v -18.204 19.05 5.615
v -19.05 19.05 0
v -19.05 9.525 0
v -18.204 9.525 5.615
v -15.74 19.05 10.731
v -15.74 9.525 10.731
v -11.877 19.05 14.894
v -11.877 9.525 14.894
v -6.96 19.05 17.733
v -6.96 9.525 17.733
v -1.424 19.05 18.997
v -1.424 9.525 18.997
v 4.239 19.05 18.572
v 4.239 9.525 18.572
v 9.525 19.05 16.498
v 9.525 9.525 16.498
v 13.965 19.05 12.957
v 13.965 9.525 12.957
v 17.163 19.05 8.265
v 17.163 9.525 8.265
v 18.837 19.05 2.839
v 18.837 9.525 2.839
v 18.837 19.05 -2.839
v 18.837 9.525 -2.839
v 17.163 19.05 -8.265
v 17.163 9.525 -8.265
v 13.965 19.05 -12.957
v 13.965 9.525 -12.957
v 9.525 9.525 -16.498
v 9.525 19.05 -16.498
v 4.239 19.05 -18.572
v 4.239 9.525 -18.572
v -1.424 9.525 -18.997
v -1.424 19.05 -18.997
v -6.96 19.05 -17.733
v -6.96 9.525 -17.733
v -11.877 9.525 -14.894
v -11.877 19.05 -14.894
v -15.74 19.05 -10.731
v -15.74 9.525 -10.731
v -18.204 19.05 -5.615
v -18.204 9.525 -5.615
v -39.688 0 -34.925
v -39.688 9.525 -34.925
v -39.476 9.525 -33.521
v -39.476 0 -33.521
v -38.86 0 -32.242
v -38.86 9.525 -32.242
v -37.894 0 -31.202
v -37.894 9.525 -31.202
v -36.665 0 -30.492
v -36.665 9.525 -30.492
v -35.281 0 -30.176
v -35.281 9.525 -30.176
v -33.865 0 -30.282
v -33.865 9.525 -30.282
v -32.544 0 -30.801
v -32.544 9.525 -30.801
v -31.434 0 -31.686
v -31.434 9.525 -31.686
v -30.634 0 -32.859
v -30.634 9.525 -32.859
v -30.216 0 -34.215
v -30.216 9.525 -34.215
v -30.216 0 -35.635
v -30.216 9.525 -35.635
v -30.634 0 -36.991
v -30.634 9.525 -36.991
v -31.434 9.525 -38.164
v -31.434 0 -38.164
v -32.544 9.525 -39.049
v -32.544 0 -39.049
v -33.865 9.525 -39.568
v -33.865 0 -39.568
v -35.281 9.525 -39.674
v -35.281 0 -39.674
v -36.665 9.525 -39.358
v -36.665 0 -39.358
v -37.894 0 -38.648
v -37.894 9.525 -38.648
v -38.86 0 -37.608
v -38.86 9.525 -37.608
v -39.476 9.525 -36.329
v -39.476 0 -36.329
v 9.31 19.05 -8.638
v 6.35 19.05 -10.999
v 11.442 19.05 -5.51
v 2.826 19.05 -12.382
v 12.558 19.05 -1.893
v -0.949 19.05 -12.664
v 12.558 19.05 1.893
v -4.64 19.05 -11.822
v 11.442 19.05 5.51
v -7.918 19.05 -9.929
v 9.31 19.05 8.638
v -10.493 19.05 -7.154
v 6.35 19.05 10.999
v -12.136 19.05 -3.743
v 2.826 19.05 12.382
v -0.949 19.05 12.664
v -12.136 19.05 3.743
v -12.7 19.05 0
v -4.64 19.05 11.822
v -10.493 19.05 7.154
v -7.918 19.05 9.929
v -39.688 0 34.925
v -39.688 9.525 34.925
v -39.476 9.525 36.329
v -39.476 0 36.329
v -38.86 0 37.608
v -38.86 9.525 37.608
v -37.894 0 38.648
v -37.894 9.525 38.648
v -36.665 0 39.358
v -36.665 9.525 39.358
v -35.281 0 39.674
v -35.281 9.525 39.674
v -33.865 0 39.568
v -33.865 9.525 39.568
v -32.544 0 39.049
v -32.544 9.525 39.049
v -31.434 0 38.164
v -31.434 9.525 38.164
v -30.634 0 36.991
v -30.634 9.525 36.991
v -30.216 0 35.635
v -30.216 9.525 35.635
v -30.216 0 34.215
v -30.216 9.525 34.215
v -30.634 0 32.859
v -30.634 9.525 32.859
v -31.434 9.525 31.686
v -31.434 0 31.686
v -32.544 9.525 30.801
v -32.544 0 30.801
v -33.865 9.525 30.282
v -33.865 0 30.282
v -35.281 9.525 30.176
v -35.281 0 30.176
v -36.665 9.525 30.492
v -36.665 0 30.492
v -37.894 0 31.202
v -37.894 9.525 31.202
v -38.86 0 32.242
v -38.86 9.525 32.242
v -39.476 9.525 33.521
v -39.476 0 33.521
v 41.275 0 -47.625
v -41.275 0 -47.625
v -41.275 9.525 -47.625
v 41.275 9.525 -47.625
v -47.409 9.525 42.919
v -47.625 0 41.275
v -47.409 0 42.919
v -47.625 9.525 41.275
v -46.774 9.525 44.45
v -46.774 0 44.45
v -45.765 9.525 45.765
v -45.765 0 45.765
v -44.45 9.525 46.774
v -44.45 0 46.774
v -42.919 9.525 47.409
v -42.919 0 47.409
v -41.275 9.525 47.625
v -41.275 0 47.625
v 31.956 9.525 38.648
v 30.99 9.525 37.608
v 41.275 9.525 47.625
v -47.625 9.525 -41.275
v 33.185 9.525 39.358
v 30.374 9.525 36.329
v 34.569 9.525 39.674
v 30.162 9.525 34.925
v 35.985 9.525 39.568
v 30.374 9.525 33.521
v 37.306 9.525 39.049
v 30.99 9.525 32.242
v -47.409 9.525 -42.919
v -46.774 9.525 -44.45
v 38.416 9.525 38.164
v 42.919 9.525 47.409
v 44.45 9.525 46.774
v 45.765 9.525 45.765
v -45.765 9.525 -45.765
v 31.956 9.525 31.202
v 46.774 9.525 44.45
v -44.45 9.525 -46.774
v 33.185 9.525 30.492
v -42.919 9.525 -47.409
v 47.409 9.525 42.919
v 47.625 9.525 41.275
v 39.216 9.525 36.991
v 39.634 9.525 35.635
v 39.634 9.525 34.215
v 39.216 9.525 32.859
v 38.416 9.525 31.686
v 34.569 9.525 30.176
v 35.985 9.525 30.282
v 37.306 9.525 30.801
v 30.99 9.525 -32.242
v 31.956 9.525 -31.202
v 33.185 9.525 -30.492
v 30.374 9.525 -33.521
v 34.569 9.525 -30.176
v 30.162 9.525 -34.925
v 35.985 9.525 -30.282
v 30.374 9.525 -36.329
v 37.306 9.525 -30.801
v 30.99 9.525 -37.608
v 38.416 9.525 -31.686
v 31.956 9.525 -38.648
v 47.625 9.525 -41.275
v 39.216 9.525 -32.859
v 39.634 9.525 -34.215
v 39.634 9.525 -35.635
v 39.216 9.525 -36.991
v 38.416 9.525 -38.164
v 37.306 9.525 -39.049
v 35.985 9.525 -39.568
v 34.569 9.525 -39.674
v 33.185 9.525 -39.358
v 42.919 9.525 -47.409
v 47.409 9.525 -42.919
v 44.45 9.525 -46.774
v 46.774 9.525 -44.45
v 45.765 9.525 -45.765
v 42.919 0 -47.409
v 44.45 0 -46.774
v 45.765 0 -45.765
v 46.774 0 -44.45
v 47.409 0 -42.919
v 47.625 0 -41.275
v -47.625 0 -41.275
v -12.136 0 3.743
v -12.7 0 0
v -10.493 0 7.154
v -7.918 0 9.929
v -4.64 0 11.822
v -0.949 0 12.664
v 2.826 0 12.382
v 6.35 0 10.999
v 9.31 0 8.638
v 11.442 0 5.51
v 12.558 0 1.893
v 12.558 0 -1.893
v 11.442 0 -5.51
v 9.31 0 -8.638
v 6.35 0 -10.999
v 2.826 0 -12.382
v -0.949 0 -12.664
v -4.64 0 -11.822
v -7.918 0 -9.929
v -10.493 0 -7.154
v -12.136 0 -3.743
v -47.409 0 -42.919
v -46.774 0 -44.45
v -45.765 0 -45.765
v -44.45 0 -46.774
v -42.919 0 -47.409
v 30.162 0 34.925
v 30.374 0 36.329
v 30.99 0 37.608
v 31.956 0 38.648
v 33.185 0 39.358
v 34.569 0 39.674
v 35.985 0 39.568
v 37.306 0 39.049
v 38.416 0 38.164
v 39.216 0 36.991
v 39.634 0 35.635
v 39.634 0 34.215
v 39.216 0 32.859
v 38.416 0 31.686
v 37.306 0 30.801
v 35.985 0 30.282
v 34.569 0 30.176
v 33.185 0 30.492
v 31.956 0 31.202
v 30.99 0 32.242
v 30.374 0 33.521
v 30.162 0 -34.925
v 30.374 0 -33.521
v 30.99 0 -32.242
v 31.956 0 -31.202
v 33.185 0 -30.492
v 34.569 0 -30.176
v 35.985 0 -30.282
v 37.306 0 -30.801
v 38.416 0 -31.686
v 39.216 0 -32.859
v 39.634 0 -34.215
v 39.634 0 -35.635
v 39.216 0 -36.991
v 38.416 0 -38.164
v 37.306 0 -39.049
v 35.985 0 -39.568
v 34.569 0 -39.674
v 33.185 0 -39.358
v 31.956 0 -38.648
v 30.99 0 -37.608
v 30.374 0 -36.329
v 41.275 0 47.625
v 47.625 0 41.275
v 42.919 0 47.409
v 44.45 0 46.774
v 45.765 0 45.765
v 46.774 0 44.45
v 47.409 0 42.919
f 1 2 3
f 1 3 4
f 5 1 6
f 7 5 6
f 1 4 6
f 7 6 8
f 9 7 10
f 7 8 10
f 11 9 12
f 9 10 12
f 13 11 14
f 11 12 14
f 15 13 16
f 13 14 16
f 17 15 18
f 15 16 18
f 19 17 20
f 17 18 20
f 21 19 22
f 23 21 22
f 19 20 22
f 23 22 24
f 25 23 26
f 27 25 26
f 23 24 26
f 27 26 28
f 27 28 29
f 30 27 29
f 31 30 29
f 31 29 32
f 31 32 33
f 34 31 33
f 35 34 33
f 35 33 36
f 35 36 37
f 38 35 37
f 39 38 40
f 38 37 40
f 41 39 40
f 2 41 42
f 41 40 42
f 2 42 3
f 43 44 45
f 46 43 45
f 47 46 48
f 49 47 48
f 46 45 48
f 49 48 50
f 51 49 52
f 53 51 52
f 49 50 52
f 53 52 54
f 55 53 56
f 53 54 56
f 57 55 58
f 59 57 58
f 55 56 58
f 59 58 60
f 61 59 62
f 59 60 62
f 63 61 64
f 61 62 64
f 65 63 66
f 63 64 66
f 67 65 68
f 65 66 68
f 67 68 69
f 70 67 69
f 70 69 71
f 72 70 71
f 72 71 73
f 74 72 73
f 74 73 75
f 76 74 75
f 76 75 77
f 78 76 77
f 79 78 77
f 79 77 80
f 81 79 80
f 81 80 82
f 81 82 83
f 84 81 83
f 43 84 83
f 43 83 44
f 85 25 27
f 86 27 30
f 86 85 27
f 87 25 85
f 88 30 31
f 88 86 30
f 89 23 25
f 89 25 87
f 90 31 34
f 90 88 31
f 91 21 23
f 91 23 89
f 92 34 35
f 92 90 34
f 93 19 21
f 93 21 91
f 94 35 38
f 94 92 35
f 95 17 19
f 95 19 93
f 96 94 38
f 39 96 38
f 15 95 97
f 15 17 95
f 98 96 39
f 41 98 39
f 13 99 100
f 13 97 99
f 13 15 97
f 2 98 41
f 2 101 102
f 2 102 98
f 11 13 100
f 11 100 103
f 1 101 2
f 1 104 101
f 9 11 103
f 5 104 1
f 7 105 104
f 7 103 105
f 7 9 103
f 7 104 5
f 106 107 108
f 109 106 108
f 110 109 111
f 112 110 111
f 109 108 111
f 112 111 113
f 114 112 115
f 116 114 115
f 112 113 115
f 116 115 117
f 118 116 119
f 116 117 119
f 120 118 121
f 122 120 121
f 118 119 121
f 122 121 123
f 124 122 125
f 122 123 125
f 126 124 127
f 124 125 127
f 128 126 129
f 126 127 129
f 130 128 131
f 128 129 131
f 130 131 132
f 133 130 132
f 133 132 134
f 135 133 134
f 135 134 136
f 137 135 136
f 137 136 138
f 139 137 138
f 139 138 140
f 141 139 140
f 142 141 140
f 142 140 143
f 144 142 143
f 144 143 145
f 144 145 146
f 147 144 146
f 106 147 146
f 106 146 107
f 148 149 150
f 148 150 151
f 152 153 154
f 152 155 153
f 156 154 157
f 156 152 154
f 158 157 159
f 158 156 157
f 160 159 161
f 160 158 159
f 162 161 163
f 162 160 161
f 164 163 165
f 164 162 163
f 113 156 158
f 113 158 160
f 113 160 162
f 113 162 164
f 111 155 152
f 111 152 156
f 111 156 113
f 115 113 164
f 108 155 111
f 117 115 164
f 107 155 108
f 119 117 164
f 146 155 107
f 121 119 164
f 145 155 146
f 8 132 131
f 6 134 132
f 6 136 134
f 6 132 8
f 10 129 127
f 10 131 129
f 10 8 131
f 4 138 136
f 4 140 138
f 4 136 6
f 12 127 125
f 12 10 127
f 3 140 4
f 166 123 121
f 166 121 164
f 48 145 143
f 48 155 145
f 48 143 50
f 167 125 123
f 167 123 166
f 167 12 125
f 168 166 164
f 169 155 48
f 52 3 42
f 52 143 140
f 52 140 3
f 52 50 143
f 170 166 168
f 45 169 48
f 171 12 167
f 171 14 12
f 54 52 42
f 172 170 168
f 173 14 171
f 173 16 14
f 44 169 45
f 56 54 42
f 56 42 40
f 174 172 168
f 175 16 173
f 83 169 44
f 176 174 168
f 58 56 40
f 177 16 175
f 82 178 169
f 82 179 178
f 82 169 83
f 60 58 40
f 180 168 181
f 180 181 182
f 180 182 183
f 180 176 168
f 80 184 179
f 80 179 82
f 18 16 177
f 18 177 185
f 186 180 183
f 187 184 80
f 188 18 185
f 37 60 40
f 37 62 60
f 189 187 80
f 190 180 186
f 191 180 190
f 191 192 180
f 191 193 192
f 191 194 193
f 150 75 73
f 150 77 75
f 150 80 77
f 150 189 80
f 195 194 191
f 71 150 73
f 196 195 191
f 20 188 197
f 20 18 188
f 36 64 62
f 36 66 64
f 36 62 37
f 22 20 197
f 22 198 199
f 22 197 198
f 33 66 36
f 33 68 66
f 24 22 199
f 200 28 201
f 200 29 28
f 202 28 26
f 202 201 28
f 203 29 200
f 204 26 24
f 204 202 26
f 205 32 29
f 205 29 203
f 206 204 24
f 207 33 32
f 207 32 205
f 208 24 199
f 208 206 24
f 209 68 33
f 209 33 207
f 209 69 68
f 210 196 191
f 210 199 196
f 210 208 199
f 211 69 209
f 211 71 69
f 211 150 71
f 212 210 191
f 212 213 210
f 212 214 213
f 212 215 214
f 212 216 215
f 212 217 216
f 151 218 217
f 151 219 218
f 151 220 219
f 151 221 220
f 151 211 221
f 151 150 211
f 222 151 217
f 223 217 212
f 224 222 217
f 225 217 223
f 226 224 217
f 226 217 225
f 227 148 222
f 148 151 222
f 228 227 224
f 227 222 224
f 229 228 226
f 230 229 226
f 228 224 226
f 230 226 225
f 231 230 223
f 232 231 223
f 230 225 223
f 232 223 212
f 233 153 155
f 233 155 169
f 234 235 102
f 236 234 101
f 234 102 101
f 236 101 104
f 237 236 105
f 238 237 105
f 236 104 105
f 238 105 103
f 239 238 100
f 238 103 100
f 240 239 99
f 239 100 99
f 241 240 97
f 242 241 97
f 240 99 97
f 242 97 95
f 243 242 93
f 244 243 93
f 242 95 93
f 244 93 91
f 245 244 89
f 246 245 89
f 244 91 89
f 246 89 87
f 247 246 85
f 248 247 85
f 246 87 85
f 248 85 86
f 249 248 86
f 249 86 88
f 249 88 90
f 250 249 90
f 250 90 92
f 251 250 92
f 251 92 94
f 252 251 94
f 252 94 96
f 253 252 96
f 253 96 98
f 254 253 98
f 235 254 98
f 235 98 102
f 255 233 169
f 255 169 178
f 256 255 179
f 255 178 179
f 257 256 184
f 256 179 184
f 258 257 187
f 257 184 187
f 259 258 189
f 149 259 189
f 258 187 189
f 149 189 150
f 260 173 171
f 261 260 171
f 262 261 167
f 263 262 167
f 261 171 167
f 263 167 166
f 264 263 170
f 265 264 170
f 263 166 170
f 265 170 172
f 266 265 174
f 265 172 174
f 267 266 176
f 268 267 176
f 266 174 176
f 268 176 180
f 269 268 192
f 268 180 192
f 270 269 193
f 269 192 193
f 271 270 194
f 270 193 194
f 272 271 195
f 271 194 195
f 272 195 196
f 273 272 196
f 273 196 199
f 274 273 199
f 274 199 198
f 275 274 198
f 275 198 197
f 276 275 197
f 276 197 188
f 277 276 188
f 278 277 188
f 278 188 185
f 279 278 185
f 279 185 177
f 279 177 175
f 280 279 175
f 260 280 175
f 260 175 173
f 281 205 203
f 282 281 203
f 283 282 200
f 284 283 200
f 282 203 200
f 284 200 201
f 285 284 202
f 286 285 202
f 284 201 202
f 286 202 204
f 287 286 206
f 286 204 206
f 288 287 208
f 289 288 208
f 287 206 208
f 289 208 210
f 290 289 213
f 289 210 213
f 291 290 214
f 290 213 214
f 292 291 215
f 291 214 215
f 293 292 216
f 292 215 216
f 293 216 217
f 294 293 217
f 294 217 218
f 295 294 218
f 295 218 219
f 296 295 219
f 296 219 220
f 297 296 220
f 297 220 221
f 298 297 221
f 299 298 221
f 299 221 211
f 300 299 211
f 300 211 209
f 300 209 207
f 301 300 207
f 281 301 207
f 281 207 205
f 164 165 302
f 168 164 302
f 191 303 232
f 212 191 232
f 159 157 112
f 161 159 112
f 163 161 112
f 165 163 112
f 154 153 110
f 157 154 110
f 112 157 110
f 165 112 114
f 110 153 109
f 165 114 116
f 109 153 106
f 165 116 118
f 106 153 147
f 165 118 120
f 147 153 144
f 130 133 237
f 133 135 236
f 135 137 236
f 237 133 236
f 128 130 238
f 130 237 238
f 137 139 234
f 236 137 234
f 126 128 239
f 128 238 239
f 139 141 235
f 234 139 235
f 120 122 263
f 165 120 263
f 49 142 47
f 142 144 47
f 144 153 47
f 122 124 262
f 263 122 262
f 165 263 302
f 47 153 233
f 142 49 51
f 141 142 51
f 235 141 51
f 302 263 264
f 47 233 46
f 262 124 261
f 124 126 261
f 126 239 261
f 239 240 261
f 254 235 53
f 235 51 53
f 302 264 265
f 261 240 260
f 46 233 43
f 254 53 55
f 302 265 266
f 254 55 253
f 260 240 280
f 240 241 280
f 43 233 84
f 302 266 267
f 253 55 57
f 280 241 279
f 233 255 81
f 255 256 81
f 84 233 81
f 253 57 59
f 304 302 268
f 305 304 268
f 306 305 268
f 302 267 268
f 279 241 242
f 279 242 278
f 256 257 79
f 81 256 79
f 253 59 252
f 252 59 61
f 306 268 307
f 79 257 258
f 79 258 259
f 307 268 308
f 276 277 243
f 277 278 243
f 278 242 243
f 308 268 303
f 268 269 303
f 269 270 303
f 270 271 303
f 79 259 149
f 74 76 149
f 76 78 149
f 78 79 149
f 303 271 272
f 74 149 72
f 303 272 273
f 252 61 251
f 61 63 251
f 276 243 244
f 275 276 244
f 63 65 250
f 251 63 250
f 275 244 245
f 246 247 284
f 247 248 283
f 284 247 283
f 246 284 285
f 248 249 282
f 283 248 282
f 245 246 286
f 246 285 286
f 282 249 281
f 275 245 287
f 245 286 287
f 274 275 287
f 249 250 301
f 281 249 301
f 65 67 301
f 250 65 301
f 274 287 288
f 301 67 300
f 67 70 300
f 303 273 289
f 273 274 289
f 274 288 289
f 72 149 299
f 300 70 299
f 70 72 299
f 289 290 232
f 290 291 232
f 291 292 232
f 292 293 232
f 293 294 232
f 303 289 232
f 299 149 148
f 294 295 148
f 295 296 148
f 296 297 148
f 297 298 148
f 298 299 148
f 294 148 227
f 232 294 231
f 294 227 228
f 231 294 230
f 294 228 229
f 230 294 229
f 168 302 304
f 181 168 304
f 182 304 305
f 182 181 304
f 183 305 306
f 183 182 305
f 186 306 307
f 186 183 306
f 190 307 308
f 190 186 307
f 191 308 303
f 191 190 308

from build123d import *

# Parameters (mm, degrees)
SKETCH1_W          = 95.25
SKETCH1_H          = 95.25
EXTRUDE1_DEPTH     = 9.525
SKETCH2_R          = 19.05
EXTRUDE2_DEPTH     = 9.525
SKETCH3_R          = 12.7
CUT_EXTRUDE1_DEPTH = 20.05
FILLET1_R          = 6.35
CUT_EXTRUDE2_REACH = 11.525
SKETCH4_R          = 4.7625


with BuildPart() as part:
    # Sketch1 → Extrude1 (new body)
    with BuildSketch(Plane(origin=(0, 0, 0), x_dir=(1, 0, 0), z_dir=(0, 1, 0))):
        Rectangle(SKETCH1_W, SKETCH1_H)
    extrude(amount=EXTRUDE1_DEPTH)

    # Sketch2 → Extrude2 (add)
    with BuildSketch(Plane(origin=(0, 9.525, 0), x_dir=(-1, 0, 0), z_dir=(0, 1, 0))):
        Circle(SKETCH2_R)
    extrude(amount=EXTRUDE2_DEPTH)

    # Sketch3 → Cut-Extrude1 (cut, through all)
    with BuildSketch(Plane(origin=(0, 19.05, 0), x_dir=(-1, 0, 0), z_dir=(0, 1, 0))):
        Circle(SKETCH3_R)
    extrude(amount=-CUT_EXTRUDE1_DEPTH, mode=Mode.SUBTRACT)

    # Fillet1
    fillet1_edges = [part.edges().sort_by_distance(p)[0] for p in [
        (-47.625, 4.7625, -47.625),
        (47.625, 4.7625, -47.625),
        (47.625, 4.7625, 47.625),
        (-47.625, 4.7625, 47.625),
    ]]
    fillet(fillet1_edges, radius=FILLET1_R)

    # Sketch4 → Cut-Extrude2 (cut, up to next)
    with BuildSketch(Plane(origin=(0, 9.525, 0), x_dir=(-1, 0, 0), z_dir=(0, 1, 0)), mode=Mode.PRIVATE) as cut_extrude2_sk1:
        with Locations((-34.925, -34.925)):
            Circle(SKETCH4_R)
    cut_extrude2_tool1 = extrude(cut_extrude2_sk1.sketch, amount=-CUT_EXTRUDE2_REACH, mode=Mode.PRIVATE) & part.part
    add(cut_extrude2_tool1.solids().sort_by_distance((34.925, 9.525, -34.925))[0], mode=Mode.SUBTRACT)
    # Sketch4 → Cut-Extrude2 (cut, up to next)
    with BuildSketch(Plane(origin=(0, 9.525, 0), x_dir=(-1, 0, 0), z_dir=(0, 1, 0)), mode=Mode.PRIVATE) as cut_extrude2_sk2:
        with Locations((34.925, -34.925)):
            Circle(SKETCH4_R)
    cut_extrude2_tool2 = extrude(cut_extrude2_sk2.sketch, amount=-CUT_EXTRUDE2_REACH, mode=Mode.PRIVATE) & part.part
    add(cut_extrude2_tool2.solids().sort_by_distance((-34.925, 9.525, -34.925))[0], mode=Mode.SUBTRACT)
    # Sketch4 → Cut-Extrude2 (cut, up to next)
    with BuildSketch(Plane(origin=(0, 9.525, 0), x_dir=(-1, 0, 0), z_dir=(0, 1, 0)), mode=Mode.PRIVATE) as cut_extrude2_sk3:
        with Locations((34.925, 34.925)):
            Circle(SKETCH4_R)
    cut_extrude2_tool3 = extrude(cut_extrude2_sk3.sketch, amount=-CUT_EXTRUDE2_REACH, mode=Mode.PRIVATE) & part.part
    add(cut_extrude2_tool3.solids().sort_by_distance((-34.925, 9.525, 34.925))[0], mode=Mode.SUBTRACT)
    # Sketch4 → Cut-Extrude2 (cut, up to next)
    with BuildSketch(Plane(origin=(0, 9.525, 0), x_dir=(-1, 0, 0), z_dir=(0, 1, 0)), mode=Mode.PRIVATE) as cut_extrude2_sk4:
        with Locations((-34.925, 34.925)):
            Circle(SKETCH4_R)
    cut_extrude2_tool4 = extrude(cut_extrude2_sk4.sketch, amount=-CUT_EXTRUDE2_REACH, mode=Mode.PRIVATE) & part.part
    add(cut_extrude2_tool4.solids().sort_by_distance((34.925, 9.525, 34.925))[0], mode=Mode.SUBTRACT)


solid = part.part
